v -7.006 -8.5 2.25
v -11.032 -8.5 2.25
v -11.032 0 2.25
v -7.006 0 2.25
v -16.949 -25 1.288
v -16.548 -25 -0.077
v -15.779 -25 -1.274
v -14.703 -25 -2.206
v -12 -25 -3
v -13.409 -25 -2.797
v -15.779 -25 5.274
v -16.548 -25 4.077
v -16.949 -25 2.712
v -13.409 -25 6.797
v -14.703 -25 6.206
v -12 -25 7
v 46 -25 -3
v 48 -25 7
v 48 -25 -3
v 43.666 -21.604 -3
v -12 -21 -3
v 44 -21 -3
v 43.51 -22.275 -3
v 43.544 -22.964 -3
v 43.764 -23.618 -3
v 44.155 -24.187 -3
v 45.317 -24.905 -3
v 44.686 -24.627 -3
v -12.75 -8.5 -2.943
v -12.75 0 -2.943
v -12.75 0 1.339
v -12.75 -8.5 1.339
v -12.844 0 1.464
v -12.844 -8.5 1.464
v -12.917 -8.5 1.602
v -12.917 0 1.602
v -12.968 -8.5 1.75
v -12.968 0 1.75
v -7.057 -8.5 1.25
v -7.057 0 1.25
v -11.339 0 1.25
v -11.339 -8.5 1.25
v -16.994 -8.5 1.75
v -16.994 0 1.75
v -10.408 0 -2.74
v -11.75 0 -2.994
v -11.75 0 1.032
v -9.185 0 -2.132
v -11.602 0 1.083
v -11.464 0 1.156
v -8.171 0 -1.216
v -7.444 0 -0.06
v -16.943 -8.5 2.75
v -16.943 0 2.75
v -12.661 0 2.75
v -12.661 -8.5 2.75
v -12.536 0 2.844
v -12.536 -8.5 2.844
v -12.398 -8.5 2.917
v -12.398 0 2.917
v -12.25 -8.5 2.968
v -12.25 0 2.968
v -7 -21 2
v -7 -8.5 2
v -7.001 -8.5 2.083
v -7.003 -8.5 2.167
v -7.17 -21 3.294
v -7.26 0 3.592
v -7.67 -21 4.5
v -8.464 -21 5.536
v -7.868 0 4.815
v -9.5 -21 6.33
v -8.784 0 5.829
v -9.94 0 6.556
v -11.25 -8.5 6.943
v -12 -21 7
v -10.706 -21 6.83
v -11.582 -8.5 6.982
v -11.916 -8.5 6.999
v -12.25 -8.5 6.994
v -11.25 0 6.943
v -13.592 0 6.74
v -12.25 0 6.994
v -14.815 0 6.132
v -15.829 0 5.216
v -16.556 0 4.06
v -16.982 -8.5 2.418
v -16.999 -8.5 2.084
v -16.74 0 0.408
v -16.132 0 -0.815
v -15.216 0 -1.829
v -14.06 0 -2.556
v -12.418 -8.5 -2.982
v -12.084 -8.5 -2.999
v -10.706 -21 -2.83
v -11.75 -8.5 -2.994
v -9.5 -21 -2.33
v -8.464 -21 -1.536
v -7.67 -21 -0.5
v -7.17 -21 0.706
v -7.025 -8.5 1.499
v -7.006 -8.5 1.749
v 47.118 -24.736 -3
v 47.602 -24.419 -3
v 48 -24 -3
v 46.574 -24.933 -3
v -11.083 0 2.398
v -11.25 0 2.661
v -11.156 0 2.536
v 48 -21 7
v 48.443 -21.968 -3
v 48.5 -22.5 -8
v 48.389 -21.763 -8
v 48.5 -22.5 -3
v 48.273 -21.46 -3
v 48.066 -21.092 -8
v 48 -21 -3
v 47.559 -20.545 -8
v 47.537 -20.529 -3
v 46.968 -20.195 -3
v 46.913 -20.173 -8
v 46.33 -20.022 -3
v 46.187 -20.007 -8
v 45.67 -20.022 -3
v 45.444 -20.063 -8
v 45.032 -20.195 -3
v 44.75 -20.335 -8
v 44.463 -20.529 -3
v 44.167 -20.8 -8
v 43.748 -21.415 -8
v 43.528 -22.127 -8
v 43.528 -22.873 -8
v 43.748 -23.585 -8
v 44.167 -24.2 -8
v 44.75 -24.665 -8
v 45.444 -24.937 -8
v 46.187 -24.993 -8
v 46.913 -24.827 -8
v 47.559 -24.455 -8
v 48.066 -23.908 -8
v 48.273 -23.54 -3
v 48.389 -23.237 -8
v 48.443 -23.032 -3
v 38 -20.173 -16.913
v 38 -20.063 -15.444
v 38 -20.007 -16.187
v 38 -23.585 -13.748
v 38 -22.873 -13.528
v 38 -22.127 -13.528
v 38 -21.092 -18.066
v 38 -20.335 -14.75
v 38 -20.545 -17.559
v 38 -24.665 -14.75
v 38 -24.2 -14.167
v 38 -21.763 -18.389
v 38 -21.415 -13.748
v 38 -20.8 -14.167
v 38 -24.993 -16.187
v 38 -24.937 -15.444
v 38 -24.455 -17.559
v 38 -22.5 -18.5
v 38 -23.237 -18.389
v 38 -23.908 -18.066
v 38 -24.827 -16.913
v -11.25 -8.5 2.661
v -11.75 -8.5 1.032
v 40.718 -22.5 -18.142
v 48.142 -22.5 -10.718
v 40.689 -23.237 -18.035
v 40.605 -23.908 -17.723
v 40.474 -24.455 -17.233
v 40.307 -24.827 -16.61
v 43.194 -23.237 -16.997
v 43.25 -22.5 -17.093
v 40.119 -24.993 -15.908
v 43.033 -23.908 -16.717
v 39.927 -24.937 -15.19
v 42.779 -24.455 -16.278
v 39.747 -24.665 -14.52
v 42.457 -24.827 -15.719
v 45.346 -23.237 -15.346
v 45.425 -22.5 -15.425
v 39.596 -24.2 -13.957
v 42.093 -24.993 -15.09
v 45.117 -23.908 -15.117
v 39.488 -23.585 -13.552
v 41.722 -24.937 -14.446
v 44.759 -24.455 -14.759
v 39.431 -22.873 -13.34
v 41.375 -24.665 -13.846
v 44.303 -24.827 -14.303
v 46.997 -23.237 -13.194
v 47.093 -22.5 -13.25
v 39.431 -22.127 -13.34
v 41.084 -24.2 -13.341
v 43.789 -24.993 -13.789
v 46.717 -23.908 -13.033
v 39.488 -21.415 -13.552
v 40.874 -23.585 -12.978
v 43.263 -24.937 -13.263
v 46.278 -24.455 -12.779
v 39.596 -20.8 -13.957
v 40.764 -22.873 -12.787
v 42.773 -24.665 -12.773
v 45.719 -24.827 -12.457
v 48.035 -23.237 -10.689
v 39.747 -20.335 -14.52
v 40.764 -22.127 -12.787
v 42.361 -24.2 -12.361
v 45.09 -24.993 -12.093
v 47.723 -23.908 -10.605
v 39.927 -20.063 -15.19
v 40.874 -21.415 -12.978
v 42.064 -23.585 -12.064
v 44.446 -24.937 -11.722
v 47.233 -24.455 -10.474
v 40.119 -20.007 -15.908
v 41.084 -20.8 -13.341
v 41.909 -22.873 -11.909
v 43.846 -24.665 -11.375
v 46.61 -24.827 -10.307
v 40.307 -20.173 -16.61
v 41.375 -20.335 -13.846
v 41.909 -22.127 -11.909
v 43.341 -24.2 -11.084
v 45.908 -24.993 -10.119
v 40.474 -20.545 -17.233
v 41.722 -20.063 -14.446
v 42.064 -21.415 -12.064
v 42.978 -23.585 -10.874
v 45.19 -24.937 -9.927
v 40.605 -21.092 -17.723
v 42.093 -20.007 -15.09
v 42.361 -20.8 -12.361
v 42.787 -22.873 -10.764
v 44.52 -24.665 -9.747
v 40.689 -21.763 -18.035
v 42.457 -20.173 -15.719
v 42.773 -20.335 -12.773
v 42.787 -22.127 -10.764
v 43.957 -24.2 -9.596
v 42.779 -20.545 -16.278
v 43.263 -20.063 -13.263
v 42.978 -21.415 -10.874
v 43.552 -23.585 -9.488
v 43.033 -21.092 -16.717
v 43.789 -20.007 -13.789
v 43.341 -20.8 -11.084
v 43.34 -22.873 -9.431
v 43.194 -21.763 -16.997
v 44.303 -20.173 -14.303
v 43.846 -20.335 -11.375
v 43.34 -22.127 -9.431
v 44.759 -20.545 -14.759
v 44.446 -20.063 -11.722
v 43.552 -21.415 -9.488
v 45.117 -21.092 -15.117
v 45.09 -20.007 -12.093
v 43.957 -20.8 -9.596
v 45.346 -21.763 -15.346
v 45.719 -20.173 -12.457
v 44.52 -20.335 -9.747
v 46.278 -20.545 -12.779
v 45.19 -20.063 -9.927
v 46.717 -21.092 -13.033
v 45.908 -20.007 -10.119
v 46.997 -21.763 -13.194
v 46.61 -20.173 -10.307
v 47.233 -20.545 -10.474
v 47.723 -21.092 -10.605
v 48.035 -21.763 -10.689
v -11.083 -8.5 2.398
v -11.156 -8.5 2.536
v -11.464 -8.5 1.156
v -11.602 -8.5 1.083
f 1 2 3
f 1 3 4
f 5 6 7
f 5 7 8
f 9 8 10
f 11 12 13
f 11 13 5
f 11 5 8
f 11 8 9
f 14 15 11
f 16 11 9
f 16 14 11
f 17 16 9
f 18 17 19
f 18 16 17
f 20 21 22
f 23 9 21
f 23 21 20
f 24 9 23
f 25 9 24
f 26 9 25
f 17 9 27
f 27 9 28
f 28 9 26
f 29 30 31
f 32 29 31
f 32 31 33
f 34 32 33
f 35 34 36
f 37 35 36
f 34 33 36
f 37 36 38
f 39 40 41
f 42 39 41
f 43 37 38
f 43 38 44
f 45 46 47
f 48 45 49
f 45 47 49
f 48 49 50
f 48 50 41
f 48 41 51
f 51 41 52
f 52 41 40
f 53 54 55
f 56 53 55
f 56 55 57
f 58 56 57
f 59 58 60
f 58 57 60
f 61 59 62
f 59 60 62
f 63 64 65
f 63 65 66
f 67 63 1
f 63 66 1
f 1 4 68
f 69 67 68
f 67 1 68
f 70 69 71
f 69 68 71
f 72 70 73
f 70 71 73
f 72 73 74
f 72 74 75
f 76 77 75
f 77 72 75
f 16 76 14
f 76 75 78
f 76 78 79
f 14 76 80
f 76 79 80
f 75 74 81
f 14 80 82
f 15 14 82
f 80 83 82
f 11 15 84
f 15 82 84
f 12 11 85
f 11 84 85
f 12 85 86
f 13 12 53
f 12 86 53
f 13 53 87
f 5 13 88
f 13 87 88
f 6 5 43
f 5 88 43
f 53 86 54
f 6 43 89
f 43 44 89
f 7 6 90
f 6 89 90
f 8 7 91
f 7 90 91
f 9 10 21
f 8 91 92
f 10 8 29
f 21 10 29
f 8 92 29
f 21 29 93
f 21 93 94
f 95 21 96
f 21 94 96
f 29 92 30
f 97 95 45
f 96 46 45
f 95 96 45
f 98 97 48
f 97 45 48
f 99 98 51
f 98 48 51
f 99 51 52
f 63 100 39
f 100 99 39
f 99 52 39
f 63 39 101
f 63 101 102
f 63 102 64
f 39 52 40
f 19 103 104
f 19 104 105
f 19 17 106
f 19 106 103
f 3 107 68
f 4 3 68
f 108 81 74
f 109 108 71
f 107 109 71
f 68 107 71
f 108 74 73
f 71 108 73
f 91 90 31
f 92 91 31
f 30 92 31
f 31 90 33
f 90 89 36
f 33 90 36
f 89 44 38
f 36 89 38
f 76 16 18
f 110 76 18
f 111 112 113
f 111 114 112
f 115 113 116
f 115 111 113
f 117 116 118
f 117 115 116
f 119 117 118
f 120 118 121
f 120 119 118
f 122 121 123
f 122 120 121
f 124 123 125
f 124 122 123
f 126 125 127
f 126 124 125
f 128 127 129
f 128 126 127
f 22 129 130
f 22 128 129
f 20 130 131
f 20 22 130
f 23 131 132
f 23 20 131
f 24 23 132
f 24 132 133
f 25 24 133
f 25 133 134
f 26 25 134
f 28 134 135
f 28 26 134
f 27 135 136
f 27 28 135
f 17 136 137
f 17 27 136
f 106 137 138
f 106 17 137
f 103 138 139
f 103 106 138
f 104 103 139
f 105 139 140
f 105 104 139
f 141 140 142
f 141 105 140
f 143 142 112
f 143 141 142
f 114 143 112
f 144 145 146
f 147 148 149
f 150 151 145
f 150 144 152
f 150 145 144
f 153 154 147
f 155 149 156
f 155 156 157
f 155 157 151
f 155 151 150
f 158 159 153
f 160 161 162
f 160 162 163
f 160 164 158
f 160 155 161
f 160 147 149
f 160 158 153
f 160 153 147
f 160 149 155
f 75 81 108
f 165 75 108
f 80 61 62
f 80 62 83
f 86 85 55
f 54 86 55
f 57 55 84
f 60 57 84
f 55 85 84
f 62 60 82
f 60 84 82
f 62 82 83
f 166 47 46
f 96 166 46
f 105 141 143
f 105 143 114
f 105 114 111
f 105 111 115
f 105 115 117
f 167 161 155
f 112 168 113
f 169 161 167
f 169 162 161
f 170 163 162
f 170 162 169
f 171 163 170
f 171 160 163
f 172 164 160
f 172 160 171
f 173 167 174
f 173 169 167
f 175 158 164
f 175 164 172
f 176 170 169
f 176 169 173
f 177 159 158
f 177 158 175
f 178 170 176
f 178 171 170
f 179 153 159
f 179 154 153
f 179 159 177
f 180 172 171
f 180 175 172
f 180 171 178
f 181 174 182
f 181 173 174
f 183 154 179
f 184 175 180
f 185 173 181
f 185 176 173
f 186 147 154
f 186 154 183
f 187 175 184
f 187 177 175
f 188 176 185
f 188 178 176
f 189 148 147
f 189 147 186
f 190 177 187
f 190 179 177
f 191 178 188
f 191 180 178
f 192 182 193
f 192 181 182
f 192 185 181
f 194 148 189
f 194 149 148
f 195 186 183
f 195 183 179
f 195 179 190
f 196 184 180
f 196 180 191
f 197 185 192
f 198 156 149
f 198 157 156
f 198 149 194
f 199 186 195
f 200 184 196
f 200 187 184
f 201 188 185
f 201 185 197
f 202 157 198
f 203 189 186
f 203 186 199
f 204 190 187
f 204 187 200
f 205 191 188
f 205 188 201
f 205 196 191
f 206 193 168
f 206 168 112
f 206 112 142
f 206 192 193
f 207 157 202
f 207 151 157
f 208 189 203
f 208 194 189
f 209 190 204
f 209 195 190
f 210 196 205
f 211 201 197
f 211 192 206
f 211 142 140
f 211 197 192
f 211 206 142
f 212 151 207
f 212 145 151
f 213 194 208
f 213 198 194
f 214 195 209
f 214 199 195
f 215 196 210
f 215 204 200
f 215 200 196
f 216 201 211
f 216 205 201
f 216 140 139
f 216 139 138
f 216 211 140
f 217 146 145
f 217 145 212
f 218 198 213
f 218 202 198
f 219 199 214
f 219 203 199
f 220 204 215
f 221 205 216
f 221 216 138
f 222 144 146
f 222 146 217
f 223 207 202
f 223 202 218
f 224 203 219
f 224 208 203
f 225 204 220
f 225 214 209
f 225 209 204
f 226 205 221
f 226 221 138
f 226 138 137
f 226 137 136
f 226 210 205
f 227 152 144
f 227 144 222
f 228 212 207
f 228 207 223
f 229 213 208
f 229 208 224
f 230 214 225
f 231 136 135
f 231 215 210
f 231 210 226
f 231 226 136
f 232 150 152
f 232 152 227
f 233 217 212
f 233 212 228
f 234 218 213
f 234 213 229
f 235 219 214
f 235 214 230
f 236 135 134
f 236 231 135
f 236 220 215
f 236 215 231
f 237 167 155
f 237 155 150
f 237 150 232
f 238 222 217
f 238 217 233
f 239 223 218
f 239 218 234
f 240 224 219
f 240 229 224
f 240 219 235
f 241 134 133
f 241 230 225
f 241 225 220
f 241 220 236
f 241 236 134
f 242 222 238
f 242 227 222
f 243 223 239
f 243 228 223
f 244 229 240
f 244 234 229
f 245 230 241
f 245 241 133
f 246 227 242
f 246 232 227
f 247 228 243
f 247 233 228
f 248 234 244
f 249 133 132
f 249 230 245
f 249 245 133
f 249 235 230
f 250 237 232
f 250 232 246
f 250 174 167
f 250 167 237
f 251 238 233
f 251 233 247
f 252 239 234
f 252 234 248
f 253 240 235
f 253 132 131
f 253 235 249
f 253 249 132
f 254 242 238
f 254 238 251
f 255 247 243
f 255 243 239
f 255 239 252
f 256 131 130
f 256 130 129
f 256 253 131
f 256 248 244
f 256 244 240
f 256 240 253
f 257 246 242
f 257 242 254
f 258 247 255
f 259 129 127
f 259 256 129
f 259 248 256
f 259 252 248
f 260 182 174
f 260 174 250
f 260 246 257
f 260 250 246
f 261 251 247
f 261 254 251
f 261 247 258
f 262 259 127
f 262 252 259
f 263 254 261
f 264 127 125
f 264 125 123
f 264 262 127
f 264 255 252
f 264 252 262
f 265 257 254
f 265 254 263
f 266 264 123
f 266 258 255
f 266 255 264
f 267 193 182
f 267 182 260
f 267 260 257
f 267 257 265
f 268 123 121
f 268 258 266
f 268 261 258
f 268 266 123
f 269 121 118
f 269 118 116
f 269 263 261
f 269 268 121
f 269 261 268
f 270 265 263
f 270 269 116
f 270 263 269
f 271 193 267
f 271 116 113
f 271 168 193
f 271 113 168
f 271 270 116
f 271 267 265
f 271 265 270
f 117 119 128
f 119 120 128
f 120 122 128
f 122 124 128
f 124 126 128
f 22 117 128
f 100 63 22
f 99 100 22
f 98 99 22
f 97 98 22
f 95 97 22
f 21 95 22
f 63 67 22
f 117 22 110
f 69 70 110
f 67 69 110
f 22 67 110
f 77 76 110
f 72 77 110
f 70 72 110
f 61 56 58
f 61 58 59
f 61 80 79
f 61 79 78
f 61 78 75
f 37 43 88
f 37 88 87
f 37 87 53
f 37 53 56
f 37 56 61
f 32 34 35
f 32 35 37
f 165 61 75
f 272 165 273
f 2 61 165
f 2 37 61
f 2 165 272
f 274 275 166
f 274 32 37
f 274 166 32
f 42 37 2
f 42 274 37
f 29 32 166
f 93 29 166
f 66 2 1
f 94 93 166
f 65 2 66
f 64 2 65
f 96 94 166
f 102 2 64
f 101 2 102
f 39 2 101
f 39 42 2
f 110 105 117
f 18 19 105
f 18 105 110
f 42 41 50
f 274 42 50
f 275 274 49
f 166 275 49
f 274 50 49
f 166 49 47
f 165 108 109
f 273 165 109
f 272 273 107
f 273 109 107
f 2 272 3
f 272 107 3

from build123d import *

# Parameters (mm, degrees)
SKETCH083_R     = 5
PAD031_DEPTH    = 25
SKETCH084_W     = 60
SKETCH084_H     = 10
PAD032_DEPTH    = 4
SKETCH085_R     = 2.5
POCKET027_DEPTH = 8.5
SKETCH088_R     = 1
POCKET028_DEPTH = 8.5


with BuildPart() as part:
    # Sketch083 → Pad031 (new body)
    with BuildSketch(Plane.XZ):
        Circle(SKETCH083_R)
    extrude(amount=PAD031_DEPTH)

    # Sketch084 (on Face3 of Pad031) → Pad032 (join)
    with BuildSketch(Plane.XZ.offset(25)):
        with Locations((30, 0)):
            Rectangle(SKETCH084_W, SKETCH084_H)
    extrude(amount=-PAD032_DEPTH)

    # AdditivePipe: sweep along a path in Sketch086
    with BuildLine(Plane.XZ.offset(23)) as additivepipe_path:
        ThreePointArc((50, -18), (55.656854, -15.656854), (58, -10))
        Line((58, -10), (58, -5))
    # Sketch085 (on Face4 of Pad032) → AdditivePipe (sweep)
    with BuildSketch(Plane(origin=(0, 0, -5), x_dir=(1, 0, 0), z_dir=(0, 0, -1))):
        with Locations((58, 22.5)):
            Circle(SKETCH085_R)
    sweep(path=additivepipe_path.line)

    # Sketch087 (on Face2 of AdditivePipe) → Pocket027 (cut)
    with BuildSketch(Plane(origin=(0, 0, 0), x_dir=(1, 0, 0), z_dir=(0, 1, 0))):
        Polygon((-0.75, 6.25), (-0.75, 0.25), (-6.25, 0.25), (-6.25, -0.75), (-0.25, -0.75), (-0.25, -6.25), (0.75, -6.25), (0.75, -0.25), (6.25, -0.25), (6.25, 0.75), (0.25, 0.75), (0.25, 6.25), align=None)
    extrude(amount=-POCKET027_DEPTH, mode=Mode.SUBTRACT)

    # Sketch088 → Pocket028 (cut)
    with BuildSketch(Plane(origin=(0, 0, 0), x_dir=(-1, 0, 0), z_dir=(0, 1, 0))):
        Circle(SKETCH088_R)
    extrude(amount=-POCKET028_DEPTH, mode=Mode.SUBTRACT)


with BuildPart() as part_1:
    # Body013 placement: moved
    add(part.part.moved(Location((-12, 0, 2))))


solid = part_1.part
